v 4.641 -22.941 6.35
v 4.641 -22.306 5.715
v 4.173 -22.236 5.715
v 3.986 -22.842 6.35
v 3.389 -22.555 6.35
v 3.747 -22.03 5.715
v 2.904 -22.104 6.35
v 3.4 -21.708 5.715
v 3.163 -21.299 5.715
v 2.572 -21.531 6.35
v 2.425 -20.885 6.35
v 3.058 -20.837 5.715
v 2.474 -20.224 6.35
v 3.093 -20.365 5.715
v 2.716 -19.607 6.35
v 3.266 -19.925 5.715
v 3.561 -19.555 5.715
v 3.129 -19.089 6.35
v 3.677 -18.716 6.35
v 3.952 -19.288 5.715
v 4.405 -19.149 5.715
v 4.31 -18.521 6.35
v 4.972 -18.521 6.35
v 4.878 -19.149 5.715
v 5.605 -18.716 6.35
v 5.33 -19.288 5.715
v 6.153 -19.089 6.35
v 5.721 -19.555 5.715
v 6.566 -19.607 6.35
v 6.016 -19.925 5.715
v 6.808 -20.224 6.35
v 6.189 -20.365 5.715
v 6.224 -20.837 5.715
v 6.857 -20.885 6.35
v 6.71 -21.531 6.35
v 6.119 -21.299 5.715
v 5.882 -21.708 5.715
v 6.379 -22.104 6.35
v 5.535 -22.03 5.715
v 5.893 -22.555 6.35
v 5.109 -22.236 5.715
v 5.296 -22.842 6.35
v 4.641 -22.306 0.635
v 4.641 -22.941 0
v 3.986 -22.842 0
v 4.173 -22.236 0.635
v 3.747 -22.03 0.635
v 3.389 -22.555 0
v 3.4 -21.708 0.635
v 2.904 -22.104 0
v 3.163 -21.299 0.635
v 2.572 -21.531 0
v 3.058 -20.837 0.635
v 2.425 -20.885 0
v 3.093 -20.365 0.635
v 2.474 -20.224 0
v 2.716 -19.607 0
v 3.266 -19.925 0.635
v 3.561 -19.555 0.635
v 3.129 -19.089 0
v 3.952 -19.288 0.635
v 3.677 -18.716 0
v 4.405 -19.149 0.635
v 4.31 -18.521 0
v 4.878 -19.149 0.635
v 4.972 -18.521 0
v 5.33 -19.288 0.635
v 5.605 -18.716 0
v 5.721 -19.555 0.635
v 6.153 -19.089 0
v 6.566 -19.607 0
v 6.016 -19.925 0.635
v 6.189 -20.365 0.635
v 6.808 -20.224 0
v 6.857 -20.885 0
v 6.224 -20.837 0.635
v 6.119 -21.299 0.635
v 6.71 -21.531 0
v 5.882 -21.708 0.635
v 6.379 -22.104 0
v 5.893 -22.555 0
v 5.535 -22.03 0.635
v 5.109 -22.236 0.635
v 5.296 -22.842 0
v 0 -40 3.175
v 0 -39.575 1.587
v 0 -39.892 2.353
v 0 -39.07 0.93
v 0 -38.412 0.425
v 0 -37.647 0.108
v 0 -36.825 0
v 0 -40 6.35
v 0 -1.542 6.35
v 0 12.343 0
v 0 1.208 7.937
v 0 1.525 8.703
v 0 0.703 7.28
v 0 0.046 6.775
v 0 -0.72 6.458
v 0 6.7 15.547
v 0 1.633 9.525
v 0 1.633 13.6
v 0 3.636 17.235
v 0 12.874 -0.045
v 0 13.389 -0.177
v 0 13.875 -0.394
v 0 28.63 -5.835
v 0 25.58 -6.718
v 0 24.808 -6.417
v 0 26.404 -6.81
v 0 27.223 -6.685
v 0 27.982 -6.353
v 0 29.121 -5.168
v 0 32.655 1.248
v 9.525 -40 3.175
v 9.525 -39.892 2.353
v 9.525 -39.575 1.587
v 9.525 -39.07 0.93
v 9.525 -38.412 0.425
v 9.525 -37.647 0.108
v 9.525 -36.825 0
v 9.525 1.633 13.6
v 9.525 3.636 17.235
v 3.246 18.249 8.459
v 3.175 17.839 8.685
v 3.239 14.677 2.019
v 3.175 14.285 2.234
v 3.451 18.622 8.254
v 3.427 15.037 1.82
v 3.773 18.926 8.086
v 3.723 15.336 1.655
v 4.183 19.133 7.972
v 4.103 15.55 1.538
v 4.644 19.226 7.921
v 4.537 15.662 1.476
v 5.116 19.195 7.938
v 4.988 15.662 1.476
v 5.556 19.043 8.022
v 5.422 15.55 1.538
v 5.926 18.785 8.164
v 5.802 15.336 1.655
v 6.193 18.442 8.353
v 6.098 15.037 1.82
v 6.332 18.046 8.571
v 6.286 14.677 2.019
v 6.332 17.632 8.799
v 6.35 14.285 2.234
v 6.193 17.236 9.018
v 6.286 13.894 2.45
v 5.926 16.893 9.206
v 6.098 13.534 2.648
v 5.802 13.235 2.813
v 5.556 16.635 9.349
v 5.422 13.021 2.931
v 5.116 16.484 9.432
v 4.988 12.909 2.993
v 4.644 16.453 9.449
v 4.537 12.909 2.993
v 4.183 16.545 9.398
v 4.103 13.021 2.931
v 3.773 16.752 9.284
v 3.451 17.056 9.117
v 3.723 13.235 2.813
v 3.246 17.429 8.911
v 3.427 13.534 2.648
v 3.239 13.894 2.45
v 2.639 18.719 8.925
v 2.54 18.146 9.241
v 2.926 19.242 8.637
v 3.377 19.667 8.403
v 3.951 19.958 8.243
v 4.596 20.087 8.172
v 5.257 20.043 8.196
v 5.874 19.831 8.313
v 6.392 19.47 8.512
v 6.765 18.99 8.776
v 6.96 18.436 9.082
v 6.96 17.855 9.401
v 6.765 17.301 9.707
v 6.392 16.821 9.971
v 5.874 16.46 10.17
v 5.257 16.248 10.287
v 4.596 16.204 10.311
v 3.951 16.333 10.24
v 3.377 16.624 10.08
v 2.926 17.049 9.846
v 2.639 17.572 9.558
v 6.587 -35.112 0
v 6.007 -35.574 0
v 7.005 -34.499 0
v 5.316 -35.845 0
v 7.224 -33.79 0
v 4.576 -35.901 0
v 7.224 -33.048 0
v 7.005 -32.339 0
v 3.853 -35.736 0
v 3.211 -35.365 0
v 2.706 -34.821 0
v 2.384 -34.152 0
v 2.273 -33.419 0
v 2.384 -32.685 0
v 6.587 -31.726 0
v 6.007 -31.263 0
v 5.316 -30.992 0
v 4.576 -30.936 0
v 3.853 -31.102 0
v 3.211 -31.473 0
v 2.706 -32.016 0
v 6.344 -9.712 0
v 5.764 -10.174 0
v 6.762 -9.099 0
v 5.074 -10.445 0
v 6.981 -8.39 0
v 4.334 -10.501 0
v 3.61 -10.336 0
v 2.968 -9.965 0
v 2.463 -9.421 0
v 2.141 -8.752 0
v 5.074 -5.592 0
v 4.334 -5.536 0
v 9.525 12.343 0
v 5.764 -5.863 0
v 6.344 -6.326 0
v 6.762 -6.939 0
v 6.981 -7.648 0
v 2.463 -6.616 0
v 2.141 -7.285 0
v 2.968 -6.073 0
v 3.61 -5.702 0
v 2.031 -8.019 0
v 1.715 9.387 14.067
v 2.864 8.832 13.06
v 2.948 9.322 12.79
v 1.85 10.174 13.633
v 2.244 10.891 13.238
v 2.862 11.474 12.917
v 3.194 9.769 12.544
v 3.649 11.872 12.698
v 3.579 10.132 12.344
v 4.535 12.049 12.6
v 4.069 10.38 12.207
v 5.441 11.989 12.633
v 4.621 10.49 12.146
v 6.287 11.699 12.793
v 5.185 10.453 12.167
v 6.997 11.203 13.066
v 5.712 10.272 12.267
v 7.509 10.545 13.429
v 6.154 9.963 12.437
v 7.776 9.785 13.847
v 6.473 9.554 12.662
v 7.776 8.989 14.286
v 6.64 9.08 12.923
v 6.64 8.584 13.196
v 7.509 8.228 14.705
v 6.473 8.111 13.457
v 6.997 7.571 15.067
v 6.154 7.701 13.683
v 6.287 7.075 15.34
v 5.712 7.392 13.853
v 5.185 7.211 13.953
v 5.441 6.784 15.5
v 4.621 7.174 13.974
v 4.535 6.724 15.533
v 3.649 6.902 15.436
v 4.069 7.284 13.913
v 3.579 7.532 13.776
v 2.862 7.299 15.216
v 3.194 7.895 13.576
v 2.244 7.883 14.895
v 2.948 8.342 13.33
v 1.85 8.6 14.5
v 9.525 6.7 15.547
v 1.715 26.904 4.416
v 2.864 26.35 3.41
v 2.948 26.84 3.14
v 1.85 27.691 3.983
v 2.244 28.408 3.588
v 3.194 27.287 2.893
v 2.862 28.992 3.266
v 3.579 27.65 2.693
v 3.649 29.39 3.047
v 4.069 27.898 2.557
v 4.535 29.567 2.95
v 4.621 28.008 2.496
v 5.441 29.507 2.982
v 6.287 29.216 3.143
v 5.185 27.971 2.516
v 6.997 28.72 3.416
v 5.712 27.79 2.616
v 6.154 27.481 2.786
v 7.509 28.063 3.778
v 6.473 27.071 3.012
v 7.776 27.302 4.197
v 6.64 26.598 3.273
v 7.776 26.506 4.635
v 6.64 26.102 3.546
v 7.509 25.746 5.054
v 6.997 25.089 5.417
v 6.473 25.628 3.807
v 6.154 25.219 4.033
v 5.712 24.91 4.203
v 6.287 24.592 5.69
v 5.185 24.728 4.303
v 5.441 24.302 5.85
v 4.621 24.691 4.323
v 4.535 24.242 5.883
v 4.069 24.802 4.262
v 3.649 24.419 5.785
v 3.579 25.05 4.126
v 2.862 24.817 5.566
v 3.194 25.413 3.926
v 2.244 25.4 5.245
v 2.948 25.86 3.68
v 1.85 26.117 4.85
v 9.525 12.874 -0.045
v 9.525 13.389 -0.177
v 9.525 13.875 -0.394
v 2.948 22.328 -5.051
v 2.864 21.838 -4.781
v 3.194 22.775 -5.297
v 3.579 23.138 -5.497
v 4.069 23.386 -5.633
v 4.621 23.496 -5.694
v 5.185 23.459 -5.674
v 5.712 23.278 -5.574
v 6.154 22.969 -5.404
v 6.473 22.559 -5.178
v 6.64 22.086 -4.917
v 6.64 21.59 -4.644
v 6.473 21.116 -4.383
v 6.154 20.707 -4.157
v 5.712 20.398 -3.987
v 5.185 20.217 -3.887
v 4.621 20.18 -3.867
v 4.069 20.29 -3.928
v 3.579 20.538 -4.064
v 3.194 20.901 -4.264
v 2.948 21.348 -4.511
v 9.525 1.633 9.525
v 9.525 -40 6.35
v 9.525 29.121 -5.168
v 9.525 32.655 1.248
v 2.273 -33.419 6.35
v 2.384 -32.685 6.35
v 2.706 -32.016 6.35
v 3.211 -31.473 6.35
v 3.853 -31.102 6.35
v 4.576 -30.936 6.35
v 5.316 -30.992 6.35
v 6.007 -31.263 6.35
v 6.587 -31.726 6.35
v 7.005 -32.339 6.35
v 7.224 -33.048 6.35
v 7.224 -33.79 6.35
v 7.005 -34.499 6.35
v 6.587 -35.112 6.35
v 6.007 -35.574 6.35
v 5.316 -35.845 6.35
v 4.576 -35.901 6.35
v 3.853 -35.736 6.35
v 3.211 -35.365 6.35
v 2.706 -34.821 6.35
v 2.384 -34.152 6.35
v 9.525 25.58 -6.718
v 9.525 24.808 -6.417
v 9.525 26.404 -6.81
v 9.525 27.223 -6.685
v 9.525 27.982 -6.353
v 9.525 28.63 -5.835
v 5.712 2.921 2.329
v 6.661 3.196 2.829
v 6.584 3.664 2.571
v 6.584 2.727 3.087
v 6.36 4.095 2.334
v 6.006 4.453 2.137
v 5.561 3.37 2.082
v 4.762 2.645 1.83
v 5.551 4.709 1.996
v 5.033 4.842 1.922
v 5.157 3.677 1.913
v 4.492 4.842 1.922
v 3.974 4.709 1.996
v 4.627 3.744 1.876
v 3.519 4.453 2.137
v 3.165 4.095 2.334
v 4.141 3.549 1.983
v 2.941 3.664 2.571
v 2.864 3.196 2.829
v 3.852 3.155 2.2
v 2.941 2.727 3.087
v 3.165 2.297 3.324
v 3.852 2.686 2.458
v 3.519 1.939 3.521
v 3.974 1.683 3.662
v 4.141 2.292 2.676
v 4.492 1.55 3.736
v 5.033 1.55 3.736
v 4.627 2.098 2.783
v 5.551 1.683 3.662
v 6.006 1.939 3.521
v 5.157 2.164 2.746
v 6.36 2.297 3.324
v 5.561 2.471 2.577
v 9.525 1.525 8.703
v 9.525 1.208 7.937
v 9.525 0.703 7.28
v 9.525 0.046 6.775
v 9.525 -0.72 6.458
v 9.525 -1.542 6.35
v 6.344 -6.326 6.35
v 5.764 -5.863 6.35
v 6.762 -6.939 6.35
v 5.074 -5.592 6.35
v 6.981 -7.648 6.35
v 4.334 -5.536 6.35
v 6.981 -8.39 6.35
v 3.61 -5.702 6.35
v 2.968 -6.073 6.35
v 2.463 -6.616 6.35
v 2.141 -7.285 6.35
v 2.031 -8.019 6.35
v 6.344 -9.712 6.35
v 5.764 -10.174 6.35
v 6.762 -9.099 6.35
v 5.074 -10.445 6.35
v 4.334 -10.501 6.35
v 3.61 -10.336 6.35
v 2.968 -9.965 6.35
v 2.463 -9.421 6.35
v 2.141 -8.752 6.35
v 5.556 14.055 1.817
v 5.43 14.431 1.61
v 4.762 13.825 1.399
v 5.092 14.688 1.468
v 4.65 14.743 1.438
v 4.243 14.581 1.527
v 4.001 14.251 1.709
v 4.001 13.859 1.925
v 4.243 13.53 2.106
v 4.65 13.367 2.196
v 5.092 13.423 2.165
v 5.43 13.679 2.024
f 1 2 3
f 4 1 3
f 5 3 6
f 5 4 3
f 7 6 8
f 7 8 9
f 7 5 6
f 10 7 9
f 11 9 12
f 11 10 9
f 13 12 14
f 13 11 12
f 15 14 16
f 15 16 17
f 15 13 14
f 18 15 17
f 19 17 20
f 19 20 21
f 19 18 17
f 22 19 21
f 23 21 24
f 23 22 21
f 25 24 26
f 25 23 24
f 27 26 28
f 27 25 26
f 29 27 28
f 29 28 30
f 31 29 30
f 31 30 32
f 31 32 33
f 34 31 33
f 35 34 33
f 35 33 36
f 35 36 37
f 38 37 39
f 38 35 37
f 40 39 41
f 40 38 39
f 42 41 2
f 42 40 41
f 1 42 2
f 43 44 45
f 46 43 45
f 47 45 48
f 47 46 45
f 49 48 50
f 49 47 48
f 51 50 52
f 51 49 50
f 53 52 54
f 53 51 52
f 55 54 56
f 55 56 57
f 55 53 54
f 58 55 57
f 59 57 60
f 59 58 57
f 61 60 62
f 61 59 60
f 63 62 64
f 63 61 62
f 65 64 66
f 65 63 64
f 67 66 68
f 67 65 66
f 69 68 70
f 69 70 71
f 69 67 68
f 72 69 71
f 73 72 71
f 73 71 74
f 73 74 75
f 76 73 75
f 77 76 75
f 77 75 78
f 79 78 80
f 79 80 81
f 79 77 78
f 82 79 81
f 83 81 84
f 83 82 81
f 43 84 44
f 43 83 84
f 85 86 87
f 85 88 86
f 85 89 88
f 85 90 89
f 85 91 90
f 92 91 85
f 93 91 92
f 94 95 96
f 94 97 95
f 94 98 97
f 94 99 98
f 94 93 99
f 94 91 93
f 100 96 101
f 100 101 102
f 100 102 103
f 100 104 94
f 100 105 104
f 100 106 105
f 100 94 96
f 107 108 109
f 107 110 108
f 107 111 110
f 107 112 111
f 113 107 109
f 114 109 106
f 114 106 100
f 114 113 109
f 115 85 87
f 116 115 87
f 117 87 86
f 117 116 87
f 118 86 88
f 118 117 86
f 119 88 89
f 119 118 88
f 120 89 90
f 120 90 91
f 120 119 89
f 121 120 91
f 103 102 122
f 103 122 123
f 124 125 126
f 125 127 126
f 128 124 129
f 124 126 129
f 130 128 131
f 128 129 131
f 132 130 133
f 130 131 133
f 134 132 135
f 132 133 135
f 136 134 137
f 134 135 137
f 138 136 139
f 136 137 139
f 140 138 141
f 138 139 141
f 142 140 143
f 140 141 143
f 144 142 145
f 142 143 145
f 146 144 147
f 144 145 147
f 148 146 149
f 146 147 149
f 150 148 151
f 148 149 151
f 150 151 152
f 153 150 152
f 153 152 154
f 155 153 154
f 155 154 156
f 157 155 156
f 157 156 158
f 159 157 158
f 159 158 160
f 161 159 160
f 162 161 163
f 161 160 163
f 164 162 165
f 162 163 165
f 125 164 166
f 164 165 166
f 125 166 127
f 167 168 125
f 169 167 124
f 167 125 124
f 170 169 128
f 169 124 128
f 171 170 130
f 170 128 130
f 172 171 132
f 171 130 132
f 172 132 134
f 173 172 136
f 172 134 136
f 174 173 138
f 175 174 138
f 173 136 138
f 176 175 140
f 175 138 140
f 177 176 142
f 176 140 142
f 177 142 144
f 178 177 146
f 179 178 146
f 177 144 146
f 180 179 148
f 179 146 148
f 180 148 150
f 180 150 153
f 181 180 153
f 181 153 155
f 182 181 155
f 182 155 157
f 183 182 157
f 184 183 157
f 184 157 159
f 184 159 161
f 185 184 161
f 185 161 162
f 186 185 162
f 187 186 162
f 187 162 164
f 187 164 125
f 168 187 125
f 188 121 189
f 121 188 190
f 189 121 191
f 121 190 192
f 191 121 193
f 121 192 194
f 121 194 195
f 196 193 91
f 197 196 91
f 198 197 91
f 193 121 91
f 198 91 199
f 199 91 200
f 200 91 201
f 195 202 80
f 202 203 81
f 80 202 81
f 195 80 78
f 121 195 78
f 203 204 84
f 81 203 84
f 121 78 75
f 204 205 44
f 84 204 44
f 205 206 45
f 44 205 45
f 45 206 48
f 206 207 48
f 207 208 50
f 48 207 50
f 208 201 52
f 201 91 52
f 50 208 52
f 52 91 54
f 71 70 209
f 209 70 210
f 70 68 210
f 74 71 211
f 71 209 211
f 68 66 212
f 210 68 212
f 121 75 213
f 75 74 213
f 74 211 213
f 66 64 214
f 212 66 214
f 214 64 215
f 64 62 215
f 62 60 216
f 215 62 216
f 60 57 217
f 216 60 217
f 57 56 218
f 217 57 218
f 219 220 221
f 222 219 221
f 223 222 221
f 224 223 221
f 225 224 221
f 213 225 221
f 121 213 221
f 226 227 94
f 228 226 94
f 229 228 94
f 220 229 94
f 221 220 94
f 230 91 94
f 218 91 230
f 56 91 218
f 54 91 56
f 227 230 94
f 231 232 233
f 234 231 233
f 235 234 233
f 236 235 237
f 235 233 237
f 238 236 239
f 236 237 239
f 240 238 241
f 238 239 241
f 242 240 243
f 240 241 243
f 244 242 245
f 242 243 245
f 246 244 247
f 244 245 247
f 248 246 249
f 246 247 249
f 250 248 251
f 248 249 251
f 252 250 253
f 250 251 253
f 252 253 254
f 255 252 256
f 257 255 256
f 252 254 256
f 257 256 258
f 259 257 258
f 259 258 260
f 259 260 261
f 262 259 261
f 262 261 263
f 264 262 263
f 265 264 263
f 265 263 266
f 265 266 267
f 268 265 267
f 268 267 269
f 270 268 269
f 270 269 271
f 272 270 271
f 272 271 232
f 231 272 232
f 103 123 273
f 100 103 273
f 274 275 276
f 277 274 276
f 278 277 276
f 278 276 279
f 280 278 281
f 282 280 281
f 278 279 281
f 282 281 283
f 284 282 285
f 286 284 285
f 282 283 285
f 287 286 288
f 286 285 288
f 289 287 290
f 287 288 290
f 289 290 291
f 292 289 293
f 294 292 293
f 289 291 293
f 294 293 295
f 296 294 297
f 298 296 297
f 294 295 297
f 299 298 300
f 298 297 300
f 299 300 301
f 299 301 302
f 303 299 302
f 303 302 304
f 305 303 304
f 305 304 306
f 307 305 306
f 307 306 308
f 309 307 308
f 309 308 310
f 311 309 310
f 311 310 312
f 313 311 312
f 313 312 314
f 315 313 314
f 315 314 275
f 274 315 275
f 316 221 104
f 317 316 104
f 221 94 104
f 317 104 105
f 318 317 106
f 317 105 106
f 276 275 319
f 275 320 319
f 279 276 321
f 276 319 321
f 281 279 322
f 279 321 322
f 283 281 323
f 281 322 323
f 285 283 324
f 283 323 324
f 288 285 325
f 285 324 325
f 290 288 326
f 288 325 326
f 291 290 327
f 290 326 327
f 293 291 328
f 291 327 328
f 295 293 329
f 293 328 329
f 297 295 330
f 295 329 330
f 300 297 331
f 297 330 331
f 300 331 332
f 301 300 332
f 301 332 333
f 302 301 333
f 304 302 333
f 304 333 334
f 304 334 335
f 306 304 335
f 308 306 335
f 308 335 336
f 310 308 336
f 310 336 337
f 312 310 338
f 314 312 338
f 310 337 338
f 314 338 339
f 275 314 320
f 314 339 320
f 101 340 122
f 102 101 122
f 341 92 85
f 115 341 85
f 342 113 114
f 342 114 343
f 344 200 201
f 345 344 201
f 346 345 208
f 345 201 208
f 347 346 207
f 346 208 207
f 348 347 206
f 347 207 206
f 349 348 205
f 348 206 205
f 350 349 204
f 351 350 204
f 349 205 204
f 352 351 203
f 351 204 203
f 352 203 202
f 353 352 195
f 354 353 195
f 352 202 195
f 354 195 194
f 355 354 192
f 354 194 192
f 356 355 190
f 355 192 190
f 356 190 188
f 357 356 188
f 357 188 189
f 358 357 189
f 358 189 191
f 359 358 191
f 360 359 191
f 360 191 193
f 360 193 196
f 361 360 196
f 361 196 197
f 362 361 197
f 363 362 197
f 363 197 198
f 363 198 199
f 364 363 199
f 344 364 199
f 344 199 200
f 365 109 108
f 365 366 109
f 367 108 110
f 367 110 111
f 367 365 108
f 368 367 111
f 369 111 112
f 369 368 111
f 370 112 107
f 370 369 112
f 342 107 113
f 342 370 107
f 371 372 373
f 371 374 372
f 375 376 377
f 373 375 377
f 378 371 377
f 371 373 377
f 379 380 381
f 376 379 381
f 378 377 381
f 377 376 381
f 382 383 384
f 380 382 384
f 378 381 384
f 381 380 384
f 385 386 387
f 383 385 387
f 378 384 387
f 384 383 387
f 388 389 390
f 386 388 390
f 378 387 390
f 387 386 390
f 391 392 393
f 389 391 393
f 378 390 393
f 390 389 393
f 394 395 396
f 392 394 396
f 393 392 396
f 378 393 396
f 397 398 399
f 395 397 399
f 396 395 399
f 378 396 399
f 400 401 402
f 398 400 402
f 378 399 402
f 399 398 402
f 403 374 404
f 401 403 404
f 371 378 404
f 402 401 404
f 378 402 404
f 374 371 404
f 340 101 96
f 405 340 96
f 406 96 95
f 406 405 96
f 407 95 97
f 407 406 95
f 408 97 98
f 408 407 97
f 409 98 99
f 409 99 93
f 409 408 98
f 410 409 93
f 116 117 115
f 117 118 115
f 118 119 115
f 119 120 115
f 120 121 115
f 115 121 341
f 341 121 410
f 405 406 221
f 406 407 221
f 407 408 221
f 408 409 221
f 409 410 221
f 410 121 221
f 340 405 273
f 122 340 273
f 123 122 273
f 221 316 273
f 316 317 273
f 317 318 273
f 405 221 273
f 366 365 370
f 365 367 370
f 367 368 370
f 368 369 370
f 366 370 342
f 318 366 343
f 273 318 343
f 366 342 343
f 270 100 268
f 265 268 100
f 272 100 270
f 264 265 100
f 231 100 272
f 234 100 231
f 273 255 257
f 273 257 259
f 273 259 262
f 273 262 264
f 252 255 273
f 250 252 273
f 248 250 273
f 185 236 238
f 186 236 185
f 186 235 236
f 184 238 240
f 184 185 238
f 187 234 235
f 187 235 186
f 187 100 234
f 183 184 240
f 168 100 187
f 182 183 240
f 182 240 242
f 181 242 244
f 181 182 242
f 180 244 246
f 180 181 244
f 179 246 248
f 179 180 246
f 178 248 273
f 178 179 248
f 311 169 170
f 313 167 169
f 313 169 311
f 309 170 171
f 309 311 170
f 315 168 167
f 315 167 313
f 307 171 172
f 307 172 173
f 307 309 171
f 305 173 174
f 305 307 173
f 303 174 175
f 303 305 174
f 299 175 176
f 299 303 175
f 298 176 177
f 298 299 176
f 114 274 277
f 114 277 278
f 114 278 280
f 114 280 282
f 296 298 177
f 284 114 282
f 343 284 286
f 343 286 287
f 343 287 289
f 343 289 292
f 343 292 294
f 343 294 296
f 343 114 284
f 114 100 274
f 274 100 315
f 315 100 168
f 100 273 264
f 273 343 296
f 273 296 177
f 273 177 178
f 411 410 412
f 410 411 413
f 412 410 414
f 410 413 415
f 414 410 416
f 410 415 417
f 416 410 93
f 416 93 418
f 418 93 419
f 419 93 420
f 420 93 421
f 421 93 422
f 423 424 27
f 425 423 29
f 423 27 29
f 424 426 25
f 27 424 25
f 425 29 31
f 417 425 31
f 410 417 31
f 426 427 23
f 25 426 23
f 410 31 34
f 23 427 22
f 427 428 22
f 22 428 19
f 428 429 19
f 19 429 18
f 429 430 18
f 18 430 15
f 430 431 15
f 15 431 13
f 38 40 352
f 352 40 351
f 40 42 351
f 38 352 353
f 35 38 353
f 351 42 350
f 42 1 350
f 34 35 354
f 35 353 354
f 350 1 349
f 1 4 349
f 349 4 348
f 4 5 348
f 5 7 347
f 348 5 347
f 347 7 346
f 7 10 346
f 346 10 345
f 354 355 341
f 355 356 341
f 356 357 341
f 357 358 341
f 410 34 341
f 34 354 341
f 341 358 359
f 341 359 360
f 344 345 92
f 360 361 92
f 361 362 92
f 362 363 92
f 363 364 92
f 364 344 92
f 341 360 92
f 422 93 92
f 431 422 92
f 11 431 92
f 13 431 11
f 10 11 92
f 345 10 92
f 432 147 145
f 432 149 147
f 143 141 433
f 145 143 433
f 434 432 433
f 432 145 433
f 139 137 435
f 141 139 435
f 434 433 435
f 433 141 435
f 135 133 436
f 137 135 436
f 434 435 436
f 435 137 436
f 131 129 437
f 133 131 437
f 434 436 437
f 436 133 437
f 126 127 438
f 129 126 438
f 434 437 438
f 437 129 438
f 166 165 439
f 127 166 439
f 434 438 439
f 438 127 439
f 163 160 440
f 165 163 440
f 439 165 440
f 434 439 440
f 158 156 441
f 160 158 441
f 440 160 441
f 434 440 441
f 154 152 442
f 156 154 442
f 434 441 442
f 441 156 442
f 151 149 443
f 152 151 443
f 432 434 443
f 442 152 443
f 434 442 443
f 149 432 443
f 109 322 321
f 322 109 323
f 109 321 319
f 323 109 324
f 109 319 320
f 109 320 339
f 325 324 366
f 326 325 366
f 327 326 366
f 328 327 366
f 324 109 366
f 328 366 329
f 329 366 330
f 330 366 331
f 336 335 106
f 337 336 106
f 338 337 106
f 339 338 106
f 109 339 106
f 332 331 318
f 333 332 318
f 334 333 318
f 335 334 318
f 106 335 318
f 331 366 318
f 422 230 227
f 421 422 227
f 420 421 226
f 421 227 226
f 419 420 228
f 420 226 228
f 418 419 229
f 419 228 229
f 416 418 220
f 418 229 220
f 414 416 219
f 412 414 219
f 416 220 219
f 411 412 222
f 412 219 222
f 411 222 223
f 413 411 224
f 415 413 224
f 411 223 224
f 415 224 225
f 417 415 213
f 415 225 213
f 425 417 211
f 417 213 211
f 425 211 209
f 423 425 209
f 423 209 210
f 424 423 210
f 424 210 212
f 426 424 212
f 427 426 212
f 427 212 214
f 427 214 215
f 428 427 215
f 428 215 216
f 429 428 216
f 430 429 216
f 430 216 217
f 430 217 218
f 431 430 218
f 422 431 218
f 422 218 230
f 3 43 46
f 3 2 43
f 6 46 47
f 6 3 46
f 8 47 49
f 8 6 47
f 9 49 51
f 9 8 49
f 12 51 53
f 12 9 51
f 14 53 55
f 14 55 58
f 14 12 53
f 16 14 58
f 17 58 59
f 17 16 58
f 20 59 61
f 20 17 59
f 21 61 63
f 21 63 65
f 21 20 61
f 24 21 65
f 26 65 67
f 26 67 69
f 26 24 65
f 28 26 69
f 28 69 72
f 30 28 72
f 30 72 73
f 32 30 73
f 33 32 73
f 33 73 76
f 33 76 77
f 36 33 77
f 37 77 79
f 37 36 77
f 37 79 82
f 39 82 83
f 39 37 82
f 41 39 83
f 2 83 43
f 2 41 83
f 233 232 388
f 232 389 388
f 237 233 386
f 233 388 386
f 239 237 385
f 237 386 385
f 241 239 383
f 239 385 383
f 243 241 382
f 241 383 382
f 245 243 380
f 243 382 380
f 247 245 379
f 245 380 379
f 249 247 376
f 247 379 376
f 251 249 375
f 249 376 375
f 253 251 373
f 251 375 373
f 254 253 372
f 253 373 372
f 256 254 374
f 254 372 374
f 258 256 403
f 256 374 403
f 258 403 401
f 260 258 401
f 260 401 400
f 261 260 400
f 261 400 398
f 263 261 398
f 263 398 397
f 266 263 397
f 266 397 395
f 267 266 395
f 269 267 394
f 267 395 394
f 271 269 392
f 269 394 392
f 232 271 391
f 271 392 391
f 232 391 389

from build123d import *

# Parameters (mm, degrees)
BOSS_EXTRUDE1_DEPTH                    = 9.525
SKETCH2_W                              = 9.525
SKETCH2_H                              = 29.633356585
BOSS_EXTRUDE2_DEPTH                    = 10.5
BOSS_EXTRUDE3_DEPTH                    = 9.525
CUT_EXTRUDE1_DEPTH                     = 9.525
FILLET1_R                              = 3.175
F_10_24_TAPPED_HOLE1_D                 = 3.7973
F_10_24_TAPPED_HOLE1_DEPTH             = 12.83
F_10_24_TAPPED_HOLE1_CSINK_D           = 6.096
F_10_24_TAPPED_HOLE1_CSINK_ANGLE       = 90
F_10_24_TAPPED_HOLE1_TIP               = 1.140824014
F_1_8_0_125_DIAMETER_HOLE1_D           = 3.175
F_1_8_0_125_DIAMETER_HOLE1_DEPTH       = 8
F_1_8_0_125_DIAMETER_HOLE1_CSINK_D     = 4.445
F_1_8_0_125_DIAMETER_HOLE1_CSINK_ANGLE = 90
F_1_8_0_125_DIAMETER_HOLE1_TIP         = 0.953866233
F_10_CLEARANCE_HOLE1_D                 = 4.9784


with BuildPart() as part:
    # Sketch1 → Boss-Extrude1 (new body)
    with BuildSketch(Plane(origin=(0, 0, 0), x_dir=(0, 0, -1), z_dir=(1, 0, 0))):
        Polygon((0, 0), (13.510509947, 24.524806237), (7.948634247, 27.588796886), (-6.35, 1.633356585), (-6.35, -40), (0, -40), align=None)
    extrude(amount=BOSS_EXTRUDE1_DEPTH)

    # Sketch2 → Boss-Extrude2 (add)
    with BuildSketch(Plane(origin=(0, 3.063990649, 5.5618757), x_dir=(1, 0, 0), z_dir=(0, 0.482518212, 0.875885937))):
        with Locations((4.7625, 13.183321707)):
            Rectangle(SKETCH2_W, SKETCH2_H)
    extrude(amount=BOSS_EXTRUDE2_DEPTH)

    # Sketch3 → Boss-Extrude3 (add)
    with BuildSketch(Plane.ZY):
        Polygon((15.546802339, 6.699797816), (6.35, 1.633356585), (13.599802436, 1.633356585), (17.234729075, 3.635807167), align=None)
    extrude(amount=-BOSS_EXTRUDE3_DEPTH)

    # Sketch4 → Cut-Extrude1 (cut)
    with BuildSketch(Plane(origin=(9.525, 0, 0), x_dir=(0, 0, -1), z_dir=(1, 0, 0))):
        Polygon((13.510509947, 24.524806237), (7.948634247, 27.588796886), (0, 13.160125021), (0, 0), align=None)
    extrude(amount=-CUT_EXTRUDE1_DEPTH, mode=Mode.SUBTRACT)

    # Fillet1
    fillet1_edges = [part.edges().sort_by_distance(p)[0] for p in [
        (4.7625, -40, 0),
        (4.7625, 1.633356585, 6.35),
        (4.7625, 27.588796886, -7.948634247),
        (4.7625, 13.160125021, 0),
    ]]
    fillet(fillet1_edges, radius=FILLET1_R)

    # #10-24 Tapped Hole1
    with Locations(Plane(origin=(0, 8.130431879, 14.758678039), x_dir=(1, 0, 0), z_dir=(0, 0.482518212, 0.875885937))):
        with Locations((4.7625, 21.434240851), (4.7625, 1.434240851)):
            CounterSinkHole(F_10_24_TAPPED_HOLE1_D / 2, F_10_24_TAPPED_HOLE1_CSINK_D / 2, depth=F_10_24_TAPPED_HOLE1_DEPTH, counter_sink_angle=F_10_24_TAPPED_HOLE1_CSINK_ANGLE)
            with Locations((0, 0, -(F_10_24_TAPPED_HOLE1_DEPTH + F_10_24_TAPPED_HOLE1_TIP / 2))):  # 118° drill point
                Cone(0, F_10_24_TAPPED_HOLE1_D / 2, F_10_24_TAPPED_HOLE1_TIP, mode=Mode.SUBTRACT)

    # 1/8 (0.125) Diameter Hole1
    with Locations(Plane(origin=(0, 8.130431879, 14.758678039), x_dir=(1, 0, 0), z_dir=(0, 0.482518212, 0.875885937))):
        with Locations((4.7625, 11.434240851)):
            CounterSinkHole(F_1_8_0_125_DIAMETER_HOLE1_D / 2, F_1_8_0_125_DIAMETER_HOLE1_CSINK_D / 2, depth=F_1_8_0_125_DIAMETER_HOLE1_DEPTH, counter_sink_angle=F_1_8_0_125_DIAMETER_HOLE1_CSINK_ANGLE)
            with Locations((0, 0, -(F_1_8_0_125_DIAMETER_HOLE1_DEPTH + F_1_8_0_125_DIAMETER_HOLE1_TIP / 2))):  # 118° drill point
                Cone(0, F_1_8_0_125_DIAMETER_HOLE1_D / 2, F_1_8_0_125_DIAMETER_HOLE1_TIP, mode=Mode.SUBTRACT)

    # #10 Clearance Hole1 (through all)
    with Locations(Plane.XY.offset(6.35)):
        with Locations((4.7625, -33.418643415), (4.519767079, -8.018643415)):
            Hole(F_10_CLEARANCE_HOLE1_D / 2)

    # Sketch12 → 1/8 (0.125) Diameter Hole2 (revolve, cut)
    with BuildSketch(Plane(origin=(4.641133539, -20.718643415, 6.35), x_dir=(0, -1, 0), z_dir=(1, 0, 0))):
        Polygon((0, 0), (0, 6.35), (2.2225, 6.35), (1.5875, 5.715), (1.5875, 0.635), (2.2225, 0), align=None)
    revolve(axis=Axis((4.641133539, -20.718643415, 12.7), (0, 0, -1)), mode=Mode.SUBTRACT)


solid = part.part
